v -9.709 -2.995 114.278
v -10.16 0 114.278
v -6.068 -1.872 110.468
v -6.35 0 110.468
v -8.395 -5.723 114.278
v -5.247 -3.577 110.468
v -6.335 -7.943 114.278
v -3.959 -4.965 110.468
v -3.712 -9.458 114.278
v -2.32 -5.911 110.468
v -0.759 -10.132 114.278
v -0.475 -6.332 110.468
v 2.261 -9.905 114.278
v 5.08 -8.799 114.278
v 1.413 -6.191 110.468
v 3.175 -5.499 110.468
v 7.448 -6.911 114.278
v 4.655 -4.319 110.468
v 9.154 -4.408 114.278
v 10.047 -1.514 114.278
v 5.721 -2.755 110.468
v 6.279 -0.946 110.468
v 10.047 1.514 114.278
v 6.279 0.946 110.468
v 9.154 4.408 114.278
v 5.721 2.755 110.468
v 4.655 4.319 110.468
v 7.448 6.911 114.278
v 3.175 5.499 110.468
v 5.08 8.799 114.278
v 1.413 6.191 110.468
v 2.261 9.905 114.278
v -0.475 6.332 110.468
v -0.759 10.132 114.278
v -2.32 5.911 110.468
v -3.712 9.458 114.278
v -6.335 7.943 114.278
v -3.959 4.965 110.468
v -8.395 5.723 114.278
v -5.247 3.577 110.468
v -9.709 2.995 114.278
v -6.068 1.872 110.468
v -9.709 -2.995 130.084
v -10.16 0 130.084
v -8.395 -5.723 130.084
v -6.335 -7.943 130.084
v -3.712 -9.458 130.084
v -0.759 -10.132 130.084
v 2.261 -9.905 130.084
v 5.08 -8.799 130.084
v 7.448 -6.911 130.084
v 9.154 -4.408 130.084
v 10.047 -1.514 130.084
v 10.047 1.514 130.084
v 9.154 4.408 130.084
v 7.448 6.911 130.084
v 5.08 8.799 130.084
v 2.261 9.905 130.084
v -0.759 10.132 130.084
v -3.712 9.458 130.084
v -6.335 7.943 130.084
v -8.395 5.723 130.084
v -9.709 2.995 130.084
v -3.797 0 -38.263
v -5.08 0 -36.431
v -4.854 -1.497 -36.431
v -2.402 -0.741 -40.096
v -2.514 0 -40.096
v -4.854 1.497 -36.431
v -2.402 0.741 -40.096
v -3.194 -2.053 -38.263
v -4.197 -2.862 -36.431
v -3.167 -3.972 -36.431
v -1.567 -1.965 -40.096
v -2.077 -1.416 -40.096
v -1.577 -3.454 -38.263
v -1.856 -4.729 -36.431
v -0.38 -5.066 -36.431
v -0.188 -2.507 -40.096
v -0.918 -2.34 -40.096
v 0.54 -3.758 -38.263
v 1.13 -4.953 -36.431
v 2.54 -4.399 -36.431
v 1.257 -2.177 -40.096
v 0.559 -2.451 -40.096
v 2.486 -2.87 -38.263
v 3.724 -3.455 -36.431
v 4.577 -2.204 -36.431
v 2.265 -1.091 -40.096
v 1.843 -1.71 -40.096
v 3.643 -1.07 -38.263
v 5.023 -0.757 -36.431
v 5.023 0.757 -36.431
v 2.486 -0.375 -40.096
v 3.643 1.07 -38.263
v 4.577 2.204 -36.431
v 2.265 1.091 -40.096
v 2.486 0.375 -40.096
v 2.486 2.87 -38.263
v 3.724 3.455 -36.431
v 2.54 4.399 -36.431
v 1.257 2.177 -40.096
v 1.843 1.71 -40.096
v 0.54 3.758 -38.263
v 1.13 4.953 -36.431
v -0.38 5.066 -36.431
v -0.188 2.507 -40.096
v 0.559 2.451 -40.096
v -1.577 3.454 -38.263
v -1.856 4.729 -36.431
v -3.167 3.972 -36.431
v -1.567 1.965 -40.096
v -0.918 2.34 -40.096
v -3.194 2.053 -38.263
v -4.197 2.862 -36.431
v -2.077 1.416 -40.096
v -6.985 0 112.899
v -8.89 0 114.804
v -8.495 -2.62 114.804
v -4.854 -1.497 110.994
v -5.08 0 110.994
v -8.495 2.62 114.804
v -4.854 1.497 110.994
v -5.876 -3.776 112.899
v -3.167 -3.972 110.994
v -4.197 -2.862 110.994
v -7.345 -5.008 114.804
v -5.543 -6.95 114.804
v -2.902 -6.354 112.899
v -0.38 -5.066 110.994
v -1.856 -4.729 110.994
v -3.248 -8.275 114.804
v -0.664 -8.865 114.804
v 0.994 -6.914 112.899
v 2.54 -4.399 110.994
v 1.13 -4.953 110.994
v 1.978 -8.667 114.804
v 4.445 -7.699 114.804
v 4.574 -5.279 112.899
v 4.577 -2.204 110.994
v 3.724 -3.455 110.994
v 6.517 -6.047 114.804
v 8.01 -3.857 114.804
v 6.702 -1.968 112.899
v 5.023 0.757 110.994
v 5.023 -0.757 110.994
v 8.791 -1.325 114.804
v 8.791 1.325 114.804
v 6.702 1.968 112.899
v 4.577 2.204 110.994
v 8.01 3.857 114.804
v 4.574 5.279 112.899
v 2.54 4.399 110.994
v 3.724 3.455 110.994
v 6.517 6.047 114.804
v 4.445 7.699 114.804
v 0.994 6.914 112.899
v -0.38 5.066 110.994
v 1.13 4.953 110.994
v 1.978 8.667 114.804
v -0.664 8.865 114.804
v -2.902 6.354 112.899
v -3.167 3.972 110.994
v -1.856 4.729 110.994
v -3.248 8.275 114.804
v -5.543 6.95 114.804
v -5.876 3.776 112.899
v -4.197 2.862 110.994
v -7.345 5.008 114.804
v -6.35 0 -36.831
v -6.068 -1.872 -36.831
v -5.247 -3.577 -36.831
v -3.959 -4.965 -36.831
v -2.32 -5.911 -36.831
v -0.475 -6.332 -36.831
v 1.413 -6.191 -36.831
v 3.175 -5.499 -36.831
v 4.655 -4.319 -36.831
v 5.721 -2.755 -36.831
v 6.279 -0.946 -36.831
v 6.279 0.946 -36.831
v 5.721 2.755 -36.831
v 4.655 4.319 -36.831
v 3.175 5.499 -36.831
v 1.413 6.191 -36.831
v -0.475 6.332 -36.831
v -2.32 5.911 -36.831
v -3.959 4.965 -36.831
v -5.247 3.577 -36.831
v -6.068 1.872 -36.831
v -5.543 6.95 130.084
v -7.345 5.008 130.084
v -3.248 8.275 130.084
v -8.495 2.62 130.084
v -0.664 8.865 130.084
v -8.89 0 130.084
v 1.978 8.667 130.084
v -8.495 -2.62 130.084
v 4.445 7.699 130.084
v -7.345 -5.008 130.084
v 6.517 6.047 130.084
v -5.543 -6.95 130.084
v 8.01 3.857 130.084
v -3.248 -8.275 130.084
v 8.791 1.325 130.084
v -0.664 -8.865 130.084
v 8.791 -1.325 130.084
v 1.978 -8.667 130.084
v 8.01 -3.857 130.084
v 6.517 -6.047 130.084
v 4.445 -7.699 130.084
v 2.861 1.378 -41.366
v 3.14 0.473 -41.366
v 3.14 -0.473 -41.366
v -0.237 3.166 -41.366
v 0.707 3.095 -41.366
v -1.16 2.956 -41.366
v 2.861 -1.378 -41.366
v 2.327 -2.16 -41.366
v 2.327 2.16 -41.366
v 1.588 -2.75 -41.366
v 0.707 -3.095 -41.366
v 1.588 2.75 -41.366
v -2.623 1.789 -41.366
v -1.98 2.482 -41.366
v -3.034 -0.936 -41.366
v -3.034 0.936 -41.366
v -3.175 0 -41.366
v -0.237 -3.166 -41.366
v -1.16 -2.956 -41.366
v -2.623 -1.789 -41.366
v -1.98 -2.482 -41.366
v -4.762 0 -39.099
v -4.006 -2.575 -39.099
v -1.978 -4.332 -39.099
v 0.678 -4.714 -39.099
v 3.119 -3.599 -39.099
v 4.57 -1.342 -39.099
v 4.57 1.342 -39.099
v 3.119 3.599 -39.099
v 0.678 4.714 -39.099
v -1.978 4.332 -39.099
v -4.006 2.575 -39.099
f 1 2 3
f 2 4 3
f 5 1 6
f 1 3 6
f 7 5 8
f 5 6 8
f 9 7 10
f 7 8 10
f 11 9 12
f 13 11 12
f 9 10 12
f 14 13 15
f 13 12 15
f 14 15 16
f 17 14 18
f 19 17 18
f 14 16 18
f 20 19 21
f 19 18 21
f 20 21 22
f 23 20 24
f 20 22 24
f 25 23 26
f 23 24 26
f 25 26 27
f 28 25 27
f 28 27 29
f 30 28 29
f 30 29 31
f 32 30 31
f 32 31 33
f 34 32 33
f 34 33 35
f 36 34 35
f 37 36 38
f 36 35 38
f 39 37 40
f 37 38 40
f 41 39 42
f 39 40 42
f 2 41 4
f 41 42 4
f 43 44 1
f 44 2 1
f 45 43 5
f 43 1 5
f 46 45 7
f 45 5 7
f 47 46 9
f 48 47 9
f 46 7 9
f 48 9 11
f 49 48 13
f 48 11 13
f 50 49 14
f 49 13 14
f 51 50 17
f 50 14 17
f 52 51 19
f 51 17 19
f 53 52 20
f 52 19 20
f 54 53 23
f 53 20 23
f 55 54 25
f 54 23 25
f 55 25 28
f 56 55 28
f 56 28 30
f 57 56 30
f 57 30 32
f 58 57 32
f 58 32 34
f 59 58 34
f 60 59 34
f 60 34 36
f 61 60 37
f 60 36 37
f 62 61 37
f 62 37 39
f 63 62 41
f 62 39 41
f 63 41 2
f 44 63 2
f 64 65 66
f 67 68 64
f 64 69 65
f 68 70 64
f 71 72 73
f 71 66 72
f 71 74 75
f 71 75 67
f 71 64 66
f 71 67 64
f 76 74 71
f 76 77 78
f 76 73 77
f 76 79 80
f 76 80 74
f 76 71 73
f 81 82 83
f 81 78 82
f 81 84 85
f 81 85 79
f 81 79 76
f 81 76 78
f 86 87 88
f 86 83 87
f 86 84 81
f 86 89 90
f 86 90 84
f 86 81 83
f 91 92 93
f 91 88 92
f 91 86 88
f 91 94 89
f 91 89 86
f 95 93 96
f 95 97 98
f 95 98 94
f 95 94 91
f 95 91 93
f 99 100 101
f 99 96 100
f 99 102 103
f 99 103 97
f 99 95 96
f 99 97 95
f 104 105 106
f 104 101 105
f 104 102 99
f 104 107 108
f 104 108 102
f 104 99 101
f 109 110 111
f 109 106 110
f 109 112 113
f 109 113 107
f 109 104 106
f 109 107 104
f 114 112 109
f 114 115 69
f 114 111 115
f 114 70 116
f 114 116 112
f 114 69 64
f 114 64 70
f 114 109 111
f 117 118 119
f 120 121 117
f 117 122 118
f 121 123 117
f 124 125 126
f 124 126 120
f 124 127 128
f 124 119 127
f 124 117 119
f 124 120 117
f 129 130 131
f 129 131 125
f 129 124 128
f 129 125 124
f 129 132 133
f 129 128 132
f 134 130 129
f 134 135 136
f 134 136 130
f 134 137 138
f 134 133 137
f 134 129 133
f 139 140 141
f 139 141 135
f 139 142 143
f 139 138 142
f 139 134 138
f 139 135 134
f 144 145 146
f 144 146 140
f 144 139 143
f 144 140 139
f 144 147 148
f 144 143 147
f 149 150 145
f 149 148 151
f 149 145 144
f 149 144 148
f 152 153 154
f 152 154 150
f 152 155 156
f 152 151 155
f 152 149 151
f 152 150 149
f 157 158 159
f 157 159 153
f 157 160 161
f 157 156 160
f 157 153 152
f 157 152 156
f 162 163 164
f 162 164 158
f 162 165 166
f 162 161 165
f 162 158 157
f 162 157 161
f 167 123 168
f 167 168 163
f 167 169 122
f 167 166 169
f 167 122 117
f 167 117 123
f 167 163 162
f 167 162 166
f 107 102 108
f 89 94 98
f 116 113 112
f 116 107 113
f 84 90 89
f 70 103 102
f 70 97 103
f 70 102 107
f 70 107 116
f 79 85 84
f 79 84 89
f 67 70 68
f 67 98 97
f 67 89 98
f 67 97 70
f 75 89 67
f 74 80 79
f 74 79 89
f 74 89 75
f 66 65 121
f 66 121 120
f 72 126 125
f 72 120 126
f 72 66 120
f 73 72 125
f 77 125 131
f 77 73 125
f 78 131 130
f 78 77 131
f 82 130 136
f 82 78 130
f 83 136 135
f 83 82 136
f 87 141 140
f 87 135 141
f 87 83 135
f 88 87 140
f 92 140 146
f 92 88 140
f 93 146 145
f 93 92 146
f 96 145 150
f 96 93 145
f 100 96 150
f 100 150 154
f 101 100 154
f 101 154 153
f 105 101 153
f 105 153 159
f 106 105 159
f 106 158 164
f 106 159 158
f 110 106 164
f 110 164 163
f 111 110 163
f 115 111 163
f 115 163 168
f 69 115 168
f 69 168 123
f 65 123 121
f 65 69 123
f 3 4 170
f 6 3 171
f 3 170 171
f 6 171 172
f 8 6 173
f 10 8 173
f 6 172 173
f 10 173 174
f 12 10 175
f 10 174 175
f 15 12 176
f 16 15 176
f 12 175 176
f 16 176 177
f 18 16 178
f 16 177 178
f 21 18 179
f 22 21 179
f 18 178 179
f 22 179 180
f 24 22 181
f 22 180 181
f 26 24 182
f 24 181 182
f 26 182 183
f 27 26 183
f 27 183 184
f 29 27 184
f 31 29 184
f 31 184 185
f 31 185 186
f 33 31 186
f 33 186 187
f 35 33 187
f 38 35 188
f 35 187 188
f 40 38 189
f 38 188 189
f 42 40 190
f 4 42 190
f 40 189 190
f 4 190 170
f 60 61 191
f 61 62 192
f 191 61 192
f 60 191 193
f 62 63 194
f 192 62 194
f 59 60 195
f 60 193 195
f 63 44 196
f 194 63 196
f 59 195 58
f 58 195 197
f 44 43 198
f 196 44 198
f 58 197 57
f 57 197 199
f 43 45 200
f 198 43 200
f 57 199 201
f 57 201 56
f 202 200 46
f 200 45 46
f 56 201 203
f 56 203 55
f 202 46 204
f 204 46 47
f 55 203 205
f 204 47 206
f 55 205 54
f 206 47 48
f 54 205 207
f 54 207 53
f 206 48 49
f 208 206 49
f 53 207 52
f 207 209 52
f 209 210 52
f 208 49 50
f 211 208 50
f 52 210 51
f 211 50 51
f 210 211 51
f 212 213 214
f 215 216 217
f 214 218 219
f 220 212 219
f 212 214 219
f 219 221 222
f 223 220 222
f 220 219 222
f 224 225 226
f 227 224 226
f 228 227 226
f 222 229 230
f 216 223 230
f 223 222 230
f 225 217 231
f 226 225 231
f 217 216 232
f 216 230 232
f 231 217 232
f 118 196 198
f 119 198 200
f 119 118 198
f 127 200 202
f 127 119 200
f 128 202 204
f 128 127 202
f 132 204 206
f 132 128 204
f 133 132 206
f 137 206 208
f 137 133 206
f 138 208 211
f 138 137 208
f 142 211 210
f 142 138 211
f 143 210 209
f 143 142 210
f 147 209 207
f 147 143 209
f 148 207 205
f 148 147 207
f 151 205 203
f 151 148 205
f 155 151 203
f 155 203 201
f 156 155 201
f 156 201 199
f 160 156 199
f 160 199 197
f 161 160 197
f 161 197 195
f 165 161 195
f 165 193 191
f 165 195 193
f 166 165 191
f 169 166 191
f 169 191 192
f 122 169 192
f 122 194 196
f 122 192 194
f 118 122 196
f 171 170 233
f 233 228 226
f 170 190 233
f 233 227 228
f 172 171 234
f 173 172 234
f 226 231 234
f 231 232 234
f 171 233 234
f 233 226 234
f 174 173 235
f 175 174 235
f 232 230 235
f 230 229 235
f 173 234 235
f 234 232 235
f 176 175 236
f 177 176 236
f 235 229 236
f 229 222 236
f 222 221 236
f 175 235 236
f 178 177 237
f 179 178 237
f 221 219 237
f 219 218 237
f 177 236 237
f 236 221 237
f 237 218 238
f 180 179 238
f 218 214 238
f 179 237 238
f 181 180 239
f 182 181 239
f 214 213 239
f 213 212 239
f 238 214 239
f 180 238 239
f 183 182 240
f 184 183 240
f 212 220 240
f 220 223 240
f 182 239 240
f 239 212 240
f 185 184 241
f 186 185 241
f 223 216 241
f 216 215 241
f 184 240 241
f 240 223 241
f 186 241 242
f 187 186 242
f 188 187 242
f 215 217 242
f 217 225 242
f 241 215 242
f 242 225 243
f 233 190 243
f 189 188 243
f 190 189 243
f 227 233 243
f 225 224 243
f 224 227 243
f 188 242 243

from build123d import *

# Parameters (mm, degrees)
F2_T = -1.27


with BuildPart() as f1:
    # F0 (on Front) → F1 (revolve)
    with BuildSketch(Plane.XZ):
        Polygon((-3.175, -41.3657145261), (0, -41.3657145261), (0, 111.0342854739), (0, 130.0842854739), (-10.16, 130.0842854739), (-10.16, 114.2775136591), (-6.35, 110.4675136591), (-6.35, -36.8313446047), align=None)
    revolve(axis=Axis((0, 0, 34.8342854739), (0, 0, 1)))

    # F2
    f2_openings = [f1.faces().sort_by_distance(p)[0] for p in [
        (0, 0, 130.084285),
    ]]
    offset(amount=F2_T, openings=f2_openings, kind=Kind.INTERSECTION)


solid = f1.part
